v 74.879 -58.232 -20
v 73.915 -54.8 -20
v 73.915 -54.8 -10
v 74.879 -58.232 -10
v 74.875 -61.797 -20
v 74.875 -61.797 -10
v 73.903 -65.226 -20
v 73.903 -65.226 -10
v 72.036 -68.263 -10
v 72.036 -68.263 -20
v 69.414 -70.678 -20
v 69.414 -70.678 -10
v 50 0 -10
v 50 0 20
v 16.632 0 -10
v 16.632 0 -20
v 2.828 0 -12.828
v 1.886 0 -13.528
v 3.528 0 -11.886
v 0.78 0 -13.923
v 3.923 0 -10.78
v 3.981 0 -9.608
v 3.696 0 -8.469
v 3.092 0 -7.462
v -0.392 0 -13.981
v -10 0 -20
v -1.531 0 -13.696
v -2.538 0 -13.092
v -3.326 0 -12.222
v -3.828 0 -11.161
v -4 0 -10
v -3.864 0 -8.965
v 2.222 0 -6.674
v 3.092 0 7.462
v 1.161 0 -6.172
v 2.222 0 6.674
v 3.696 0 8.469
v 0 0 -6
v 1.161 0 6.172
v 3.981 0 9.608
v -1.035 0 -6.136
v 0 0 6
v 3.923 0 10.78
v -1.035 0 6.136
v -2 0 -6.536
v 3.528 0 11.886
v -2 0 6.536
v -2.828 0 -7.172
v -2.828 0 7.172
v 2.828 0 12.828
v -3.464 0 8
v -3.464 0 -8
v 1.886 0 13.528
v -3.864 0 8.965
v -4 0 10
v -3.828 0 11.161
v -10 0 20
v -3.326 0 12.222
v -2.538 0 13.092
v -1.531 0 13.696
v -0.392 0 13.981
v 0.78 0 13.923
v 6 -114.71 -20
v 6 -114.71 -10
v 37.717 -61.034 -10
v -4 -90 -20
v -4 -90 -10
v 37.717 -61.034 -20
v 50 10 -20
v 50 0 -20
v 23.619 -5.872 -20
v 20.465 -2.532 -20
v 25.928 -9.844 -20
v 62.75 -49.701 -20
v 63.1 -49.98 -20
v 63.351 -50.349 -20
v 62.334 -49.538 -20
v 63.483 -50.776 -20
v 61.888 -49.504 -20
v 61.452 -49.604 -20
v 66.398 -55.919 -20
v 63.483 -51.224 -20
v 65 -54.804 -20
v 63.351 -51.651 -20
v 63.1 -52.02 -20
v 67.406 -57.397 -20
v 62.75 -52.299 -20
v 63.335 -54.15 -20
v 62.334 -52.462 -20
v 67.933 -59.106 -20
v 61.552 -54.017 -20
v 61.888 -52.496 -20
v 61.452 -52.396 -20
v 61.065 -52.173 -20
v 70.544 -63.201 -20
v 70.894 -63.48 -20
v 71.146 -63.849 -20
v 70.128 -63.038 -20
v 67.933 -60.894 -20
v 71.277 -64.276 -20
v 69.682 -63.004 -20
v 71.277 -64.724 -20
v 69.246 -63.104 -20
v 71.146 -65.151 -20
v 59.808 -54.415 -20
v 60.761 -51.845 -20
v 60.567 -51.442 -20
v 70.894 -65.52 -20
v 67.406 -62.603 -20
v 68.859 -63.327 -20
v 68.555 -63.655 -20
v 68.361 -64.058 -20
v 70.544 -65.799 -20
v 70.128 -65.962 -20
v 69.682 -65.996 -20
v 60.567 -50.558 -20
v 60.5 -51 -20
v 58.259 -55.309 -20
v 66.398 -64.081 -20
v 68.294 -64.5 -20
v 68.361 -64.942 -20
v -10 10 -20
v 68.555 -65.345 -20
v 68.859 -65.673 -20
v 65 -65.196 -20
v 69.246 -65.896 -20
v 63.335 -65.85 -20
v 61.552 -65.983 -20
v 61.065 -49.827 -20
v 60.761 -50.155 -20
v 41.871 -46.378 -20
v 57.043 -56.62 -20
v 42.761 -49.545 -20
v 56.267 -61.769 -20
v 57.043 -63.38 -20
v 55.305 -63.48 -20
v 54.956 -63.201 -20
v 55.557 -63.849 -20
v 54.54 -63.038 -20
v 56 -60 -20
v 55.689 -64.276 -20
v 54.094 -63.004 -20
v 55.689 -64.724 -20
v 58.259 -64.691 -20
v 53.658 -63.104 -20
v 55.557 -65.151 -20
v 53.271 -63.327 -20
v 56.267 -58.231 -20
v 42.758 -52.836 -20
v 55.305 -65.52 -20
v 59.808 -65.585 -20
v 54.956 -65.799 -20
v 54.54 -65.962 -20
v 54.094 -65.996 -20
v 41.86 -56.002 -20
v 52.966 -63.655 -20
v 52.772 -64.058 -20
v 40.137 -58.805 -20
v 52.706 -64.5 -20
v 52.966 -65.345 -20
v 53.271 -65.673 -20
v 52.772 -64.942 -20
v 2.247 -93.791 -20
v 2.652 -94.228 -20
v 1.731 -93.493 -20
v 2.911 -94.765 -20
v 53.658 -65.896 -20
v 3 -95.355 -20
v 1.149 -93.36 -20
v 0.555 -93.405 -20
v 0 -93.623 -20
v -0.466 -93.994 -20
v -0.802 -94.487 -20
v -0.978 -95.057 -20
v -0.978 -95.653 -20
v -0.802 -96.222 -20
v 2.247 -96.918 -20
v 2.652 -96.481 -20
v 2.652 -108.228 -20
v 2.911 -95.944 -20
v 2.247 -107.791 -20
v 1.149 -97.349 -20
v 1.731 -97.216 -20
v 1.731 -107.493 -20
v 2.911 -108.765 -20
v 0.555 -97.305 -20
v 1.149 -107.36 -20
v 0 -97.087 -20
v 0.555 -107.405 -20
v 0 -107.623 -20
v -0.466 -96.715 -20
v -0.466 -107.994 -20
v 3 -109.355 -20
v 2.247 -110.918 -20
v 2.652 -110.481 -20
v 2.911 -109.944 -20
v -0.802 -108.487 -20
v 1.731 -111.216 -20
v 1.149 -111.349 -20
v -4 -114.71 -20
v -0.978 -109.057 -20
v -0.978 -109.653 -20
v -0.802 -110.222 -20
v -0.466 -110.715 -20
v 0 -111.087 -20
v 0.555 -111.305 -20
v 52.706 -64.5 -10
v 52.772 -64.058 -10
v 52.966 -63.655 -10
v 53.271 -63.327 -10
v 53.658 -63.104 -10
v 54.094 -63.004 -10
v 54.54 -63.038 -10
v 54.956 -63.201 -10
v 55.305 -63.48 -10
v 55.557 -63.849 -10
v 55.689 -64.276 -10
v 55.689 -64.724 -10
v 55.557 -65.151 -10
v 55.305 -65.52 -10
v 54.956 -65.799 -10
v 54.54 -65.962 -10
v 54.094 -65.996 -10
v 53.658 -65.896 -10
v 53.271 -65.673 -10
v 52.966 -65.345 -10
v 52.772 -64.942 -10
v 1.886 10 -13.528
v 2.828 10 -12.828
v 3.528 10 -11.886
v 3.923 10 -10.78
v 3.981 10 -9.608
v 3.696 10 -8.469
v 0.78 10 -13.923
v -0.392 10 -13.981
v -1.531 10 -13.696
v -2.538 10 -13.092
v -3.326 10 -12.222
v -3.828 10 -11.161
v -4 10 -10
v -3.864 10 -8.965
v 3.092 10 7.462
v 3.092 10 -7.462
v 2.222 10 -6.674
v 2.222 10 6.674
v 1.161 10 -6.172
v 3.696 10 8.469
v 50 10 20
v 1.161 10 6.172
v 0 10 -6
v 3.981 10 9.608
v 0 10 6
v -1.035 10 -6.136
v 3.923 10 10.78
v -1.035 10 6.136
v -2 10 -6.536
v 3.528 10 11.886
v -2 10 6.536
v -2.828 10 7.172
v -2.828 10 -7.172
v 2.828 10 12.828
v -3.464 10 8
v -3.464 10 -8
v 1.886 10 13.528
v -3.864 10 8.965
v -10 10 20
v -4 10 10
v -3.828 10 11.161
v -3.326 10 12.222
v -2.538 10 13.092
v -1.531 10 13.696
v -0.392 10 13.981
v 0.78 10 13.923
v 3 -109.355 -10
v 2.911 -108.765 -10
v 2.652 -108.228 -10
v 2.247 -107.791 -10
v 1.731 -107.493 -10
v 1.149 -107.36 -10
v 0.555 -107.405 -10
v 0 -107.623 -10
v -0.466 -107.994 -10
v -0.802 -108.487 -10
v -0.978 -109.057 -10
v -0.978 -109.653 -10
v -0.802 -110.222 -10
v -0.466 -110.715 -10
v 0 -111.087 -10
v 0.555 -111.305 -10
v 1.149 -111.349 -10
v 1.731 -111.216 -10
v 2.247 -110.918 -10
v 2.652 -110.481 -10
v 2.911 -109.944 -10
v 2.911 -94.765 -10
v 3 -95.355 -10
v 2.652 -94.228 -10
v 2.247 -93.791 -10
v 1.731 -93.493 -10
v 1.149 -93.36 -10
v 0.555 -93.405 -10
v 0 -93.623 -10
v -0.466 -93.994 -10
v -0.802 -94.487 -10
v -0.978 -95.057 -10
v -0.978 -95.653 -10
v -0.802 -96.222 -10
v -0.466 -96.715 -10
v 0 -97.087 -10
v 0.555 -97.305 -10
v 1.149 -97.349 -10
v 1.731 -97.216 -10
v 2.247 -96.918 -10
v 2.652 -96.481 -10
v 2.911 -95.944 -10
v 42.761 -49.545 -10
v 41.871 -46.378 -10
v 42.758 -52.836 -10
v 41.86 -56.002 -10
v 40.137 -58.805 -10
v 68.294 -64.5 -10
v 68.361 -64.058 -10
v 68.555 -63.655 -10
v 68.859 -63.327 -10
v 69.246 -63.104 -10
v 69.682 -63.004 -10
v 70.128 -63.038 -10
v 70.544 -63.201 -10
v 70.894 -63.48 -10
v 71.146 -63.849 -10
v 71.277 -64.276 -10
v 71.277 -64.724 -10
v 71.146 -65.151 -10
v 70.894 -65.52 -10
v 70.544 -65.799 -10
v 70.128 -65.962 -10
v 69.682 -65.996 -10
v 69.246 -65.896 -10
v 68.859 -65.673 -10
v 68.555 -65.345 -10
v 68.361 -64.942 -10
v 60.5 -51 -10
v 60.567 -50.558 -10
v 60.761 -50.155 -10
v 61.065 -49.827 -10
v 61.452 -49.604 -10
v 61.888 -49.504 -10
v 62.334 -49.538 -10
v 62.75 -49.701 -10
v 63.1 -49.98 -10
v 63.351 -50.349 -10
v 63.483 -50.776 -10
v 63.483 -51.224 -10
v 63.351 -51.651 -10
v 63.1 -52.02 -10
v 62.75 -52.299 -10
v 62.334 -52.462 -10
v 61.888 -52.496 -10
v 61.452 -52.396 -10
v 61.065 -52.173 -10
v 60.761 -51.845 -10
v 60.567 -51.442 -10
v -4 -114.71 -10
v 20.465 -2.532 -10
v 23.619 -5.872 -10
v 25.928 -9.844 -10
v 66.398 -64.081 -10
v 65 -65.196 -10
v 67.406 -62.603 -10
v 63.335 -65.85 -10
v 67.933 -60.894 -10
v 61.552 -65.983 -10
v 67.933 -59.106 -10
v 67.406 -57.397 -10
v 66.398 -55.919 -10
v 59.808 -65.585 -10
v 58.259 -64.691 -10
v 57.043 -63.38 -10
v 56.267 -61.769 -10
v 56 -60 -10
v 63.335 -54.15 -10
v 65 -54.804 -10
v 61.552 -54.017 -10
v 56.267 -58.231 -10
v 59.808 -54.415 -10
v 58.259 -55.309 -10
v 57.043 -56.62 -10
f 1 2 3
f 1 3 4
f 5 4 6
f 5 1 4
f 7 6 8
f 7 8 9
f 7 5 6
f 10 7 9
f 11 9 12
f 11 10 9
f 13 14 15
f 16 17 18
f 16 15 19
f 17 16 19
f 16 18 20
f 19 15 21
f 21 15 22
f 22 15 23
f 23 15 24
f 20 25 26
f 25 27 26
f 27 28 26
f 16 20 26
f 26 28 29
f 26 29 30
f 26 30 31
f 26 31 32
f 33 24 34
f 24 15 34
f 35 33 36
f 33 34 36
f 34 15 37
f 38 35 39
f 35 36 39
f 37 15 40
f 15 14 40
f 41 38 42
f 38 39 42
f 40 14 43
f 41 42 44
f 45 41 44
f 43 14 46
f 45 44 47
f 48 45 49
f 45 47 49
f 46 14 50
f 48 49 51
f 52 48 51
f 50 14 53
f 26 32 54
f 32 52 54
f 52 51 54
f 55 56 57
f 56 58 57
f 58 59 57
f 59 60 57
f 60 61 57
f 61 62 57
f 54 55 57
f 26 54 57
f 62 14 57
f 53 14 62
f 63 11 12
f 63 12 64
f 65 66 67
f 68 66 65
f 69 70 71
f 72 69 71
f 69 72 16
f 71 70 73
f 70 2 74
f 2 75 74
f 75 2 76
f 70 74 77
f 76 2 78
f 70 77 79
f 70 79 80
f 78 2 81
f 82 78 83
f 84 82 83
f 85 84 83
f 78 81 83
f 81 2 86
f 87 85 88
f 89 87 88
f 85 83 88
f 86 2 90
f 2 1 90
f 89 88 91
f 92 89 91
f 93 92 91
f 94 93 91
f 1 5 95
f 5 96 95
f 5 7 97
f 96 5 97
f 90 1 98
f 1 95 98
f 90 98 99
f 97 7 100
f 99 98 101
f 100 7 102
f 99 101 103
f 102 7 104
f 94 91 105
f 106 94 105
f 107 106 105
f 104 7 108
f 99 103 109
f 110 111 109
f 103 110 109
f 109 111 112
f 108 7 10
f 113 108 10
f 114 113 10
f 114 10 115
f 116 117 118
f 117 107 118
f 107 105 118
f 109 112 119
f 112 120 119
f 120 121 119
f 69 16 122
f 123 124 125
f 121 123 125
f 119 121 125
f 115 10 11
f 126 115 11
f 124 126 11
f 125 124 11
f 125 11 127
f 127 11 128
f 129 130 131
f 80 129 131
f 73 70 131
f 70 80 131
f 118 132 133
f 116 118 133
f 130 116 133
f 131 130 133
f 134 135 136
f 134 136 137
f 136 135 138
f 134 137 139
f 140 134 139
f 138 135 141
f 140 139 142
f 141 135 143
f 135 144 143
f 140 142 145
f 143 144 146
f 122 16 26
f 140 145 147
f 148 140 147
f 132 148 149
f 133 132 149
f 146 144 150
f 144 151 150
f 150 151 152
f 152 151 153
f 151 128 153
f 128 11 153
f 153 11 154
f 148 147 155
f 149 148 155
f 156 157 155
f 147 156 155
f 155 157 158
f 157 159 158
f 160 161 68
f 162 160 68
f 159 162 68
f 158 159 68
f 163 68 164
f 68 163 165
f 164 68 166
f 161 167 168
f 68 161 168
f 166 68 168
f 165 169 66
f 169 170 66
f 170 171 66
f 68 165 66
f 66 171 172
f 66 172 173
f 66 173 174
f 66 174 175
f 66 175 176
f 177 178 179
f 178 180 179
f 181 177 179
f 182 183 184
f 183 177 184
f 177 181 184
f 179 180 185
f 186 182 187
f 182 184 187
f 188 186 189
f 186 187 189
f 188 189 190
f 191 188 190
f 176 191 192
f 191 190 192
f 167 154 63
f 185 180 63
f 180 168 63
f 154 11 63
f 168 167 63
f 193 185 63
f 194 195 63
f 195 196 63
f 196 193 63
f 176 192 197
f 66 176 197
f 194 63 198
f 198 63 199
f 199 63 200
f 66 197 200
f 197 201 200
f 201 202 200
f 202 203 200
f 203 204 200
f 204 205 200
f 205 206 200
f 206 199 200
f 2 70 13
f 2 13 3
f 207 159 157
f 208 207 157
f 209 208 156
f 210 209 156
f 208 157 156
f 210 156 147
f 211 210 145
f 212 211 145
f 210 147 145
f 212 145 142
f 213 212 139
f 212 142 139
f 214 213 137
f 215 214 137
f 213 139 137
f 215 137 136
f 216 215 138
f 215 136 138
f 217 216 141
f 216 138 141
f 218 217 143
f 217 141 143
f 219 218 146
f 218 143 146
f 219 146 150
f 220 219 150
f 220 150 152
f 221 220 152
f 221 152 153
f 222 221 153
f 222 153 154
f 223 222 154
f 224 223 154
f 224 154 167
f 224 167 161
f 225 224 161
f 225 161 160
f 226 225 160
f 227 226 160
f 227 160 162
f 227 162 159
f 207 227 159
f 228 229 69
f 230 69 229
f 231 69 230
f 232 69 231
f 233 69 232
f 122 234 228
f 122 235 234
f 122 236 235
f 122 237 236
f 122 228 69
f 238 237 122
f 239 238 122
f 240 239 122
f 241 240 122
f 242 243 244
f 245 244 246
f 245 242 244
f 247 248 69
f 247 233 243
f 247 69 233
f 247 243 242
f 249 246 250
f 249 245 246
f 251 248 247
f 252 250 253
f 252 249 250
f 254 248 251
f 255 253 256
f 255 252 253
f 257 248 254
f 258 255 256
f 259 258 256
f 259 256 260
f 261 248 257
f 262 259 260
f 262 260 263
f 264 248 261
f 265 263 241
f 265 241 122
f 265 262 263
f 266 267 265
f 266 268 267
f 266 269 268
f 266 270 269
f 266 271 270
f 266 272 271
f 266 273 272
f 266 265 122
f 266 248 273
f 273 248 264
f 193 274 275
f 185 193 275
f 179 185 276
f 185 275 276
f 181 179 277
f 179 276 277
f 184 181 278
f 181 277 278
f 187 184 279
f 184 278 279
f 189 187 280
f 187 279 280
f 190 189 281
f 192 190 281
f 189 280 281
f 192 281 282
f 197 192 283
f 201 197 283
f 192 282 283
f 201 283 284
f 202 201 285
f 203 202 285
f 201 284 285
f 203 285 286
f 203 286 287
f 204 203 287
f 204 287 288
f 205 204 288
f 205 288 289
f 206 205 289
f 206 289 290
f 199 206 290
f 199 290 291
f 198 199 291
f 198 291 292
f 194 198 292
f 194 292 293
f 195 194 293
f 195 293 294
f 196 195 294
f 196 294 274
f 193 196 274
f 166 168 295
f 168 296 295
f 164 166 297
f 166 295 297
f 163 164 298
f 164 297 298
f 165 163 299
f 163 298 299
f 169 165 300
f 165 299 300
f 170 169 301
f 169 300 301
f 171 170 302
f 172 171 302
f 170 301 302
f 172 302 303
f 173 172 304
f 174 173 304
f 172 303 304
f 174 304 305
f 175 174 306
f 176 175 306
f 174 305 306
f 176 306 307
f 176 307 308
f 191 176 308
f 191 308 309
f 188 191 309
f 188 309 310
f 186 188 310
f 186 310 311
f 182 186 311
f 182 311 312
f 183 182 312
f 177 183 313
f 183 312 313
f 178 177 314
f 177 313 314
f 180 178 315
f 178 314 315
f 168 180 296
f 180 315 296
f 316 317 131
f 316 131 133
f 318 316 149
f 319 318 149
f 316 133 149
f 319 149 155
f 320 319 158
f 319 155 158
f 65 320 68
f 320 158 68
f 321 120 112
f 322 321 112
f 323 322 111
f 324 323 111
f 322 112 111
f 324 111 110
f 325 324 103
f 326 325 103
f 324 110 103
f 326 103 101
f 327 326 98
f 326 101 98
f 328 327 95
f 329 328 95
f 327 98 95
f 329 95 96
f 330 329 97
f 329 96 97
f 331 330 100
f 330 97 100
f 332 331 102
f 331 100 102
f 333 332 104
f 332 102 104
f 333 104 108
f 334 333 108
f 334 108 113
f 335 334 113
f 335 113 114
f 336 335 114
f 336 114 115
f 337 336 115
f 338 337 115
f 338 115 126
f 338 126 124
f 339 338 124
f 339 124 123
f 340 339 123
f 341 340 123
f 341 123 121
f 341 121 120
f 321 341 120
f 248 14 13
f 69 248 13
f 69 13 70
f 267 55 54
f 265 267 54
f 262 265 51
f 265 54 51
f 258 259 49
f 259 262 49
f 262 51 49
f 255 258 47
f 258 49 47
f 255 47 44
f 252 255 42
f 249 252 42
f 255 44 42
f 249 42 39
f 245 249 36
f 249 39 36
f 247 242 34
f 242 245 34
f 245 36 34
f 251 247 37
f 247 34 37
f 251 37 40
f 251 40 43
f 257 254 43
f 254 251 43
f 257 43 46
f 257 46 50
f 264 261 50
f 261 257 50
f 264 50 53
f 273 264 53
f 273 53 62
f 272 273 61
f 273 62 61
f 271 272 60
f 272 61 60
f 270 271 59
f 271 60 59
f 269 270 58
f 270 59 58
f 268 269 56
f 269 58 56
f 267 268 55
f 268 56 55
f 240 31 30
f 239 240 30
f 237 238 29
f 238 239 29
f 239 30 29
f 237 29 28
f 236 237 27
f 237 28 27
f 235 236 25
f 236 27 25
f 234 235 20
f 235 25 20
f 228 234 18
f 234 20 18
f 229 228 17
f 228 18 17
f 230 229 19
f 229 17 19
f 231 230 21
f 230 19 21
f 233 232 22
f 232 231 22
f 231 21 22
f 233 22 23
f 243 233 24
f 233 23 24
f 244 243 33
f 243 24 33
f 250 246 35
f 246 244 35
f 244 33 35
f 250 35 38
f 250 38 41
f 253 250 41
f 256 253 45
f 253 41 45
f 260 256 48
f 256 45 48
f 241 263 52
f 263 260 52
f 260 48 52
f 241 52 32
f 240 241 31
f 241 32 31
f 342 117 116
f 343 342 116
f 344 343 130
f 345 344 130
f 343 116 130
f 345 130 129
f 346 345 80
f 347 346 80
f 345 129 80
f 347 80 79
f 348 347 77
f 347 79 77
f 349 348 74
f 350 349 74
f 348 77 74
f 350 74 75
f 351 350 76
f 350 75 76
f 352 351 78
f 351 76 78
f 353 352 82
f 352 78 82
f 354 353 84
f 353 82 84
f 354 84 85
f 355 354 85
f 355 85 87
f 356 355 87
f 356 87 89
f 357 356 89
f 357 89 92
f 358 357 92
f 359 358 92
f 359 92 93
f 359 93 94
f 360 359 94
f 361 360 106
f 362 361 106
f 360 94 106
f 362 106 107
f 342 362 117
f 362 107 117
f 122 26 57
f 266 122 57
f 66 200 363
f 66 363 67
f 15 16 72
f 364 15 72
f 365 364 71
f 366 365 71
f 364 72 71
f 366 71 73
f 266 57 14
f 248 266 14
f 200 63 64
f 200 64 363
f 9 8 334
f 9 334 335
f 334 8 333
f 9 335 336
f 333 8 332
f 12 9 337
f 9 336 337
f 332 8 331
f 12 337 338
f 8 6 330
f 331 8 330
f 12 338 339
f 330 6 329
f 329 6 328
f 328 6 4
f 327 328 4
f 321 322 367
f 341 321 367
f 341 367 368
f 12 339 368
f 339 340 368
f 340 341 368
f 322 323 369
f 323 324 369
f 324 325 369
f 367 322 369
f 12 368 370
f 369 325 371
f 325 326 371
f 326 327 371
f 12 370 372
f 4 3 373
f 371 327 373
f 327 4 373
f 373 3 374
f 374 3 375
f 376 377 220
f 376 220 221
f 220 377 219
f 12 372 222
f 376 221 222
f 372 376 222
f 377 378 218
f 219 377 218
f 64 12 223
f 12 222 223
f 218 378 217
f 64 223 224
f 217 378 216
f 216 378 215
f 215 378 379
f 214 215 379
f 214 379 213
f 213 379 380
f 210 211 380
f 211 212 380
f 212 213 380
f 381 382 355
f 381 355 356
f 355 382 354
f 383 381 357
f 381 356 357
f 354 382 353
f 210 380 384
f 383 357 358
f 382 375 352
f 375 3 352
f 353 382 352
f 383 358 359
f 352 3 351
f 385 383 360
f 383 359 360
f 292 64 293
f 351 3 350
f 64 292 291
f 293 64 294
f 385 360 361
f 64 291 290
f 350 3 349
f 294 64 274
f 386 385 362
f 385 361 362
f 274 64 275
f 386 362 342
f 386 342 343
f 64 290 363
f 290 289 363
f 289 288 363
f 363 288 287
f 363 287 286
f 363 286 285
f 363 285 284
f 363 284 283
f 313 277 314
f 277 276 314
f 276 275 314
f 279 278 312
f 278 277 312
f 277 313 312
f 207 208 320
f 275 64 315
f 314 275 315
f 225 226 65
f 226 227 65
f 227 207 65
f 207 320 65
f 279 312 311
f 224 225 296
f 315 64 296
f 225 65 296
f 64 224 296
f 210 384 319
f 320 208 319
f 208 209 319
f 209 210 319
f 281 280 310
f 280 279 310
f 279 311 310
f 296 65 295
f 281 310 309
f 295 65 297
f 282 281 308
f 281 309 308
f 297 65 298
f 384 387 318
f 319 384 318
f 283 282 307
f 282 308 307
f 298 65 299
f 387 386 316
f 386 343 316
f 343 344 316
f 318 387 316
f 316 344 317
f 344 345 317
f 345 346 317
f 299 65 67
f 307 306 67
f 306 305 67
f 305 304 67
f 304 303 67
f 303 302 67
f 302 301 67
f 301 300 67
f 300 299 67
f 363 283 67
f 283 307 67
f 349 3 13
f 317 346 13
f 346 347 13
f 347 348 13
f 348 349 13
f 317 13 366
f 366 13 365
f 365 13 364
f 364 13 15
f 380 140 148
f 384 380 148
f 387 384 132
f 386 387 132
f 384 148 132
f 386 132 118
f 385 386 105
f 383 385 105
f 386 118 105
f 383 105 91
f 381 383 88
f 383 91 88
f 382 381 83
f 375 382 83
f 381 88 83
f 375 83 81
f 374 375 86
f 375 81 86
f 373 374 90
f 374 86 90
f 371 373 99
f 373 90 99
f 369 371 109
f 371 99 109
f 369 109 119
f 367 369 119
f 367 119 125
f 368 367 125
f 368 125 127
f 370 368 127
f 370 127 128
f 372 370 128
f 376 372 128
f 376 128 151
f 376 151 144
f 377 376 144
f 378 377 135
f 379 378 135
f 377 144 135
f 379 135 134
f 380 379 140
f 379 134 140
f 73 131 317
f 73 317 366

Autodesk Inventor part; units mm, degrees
ref_plane "YZ Plane" through (0, 0, 0) normal (1, 0, 0) x (0, 1, 0)
ref_plane "XZ Plane" through (0, 0, 0) normal (0, 1, 0) x (-1, 0, 0)
ref_plane "XY Plane" through (0, 0, 0) normal (0, 0, 1) x (1, 0, 0)
sketch "Sketch1" plane through (0, 0, 0) normal (0, 1, 0) x (-1, 0, 0)
  circle A0 centre (0, 10) radius 4
  circle A1 centre (0, -10) radius 4
  line L0 (10, 20) -> (-50, 20)
  line L1 (-50, 20) -> (-50, -20)
  line L2 (-50, -20) -> (10, -20)
  line L3 (10, -20) -> (10, 20)
  line L4 (0, 10) -> (0, -10)
  point P0 (0, 0)
  point P1 (0, 0)
  dimension "d0" = 8
  dimension "d1" = 40
  dimension "d2" = 20
  dimension "d3" = 10
extrude "Extrusion1" add sketch "Sketch1" along normal blind 10
sketch "Sketch2" plane through (50, 0, -20) normal (0, 0, -1) x (-1, 0, 0)
  circle A0 centre (-12, -60) radius 57.5 construction
  line L0 (0, 0) -> (60, 0) projected
  line L1 (0, 0) -> (-23.9149, -54.8004)
  line L2 (-0.0851, -65.1996) -> (28.3679, 0)
  circle A1 centre (-12, -60) radius 9 construction
  circle A2 centre (-4.2058, -64.5) radius 1.5
  circle A3 centre (-19.7942, -64.5) radius 1.5
  circle A4 centre (-12, -51) radius 1.5
  circle A5 centre (-12, -60) radius 13
  line L3 (-19.7942, -64.5) -> (-4.2058, -64.5) construction
  line L4 (-12, -51) -> (-4.2058, -64.5) construction
  line L5 (-19.7942, -64.5) -> (-12, -51) construction
  arc A6 (33.3679, 0) -> (24.0722, -9.8435) centre (42.4028, -17.843) ccw
  line L6 (0, 0) -> (0, 10)
  line L7 (-19.4144, -70.6783) -> (44, -114.7095)
  line L8 (44, -114.7095) -> (54, -114.7095)
  line L9 (54, -114.7095) -> (54, -90)
  line L10 (54, -90) -> (-4.5856, -49.3217)
  line L11 (0, 0) -> (0, 10) projected
  arc A7 (8.1288, -46.3777) -> (12.283, -61.0342) centre (19.1271, -51.1773) ccw
  circle A8 centre (-12, -60) radius 6
  point P0 (50, 0)
  point P1 (4.1861, -55.4122)
  dimension "d6" = 115
  dimension "d7" = 3
  dimension "d8" = 18
  dimension "d9" = 26
  dimension "d10" = 60
  dimension "d11" = 12
  dimension "d12" = 5
  dimension "d13" = 20
  dimension "d15" = 66
  dimension "d18" = 10
  dimension "d19" = 30
  dimension "d20" = 12
  dimension "d21" = 12
extrude "Extrusion2" add sketch "Sketch2" against normal blind 10
sketch "Sketch3" plane through (50, 0, -10) normal (0, 0, 1) x (1, 0, 0)
  circle A0 centre (-49, -95.3547) radius 2
  circle A1 centre (-49, -109.3547) radius 2
  line L0 (-54, -90) -> (-44, -90)
  line L1 (-44, -90) -> (-44, -114.7095)
  line L2 (-44, -114.7095) -> (-54, -114.7095)
  line L3 (-54, -114.7095) -> (-54, -90)
  line L4 (-49, -95.3547) -> (-49, -109.3547)
  point P0 (-50, 0)
  point P1 (-44, -102.3547)
  point P2 (-49, -102.3547)
  point P3 (-49, -90)
  dimension "d24" = 4
  dimension "d25" = 14
extrude "Extrusion3" cut sketch "Sketch3" against normal blind 10 contours A0 | A1
properties part number "Mount_Frame"
